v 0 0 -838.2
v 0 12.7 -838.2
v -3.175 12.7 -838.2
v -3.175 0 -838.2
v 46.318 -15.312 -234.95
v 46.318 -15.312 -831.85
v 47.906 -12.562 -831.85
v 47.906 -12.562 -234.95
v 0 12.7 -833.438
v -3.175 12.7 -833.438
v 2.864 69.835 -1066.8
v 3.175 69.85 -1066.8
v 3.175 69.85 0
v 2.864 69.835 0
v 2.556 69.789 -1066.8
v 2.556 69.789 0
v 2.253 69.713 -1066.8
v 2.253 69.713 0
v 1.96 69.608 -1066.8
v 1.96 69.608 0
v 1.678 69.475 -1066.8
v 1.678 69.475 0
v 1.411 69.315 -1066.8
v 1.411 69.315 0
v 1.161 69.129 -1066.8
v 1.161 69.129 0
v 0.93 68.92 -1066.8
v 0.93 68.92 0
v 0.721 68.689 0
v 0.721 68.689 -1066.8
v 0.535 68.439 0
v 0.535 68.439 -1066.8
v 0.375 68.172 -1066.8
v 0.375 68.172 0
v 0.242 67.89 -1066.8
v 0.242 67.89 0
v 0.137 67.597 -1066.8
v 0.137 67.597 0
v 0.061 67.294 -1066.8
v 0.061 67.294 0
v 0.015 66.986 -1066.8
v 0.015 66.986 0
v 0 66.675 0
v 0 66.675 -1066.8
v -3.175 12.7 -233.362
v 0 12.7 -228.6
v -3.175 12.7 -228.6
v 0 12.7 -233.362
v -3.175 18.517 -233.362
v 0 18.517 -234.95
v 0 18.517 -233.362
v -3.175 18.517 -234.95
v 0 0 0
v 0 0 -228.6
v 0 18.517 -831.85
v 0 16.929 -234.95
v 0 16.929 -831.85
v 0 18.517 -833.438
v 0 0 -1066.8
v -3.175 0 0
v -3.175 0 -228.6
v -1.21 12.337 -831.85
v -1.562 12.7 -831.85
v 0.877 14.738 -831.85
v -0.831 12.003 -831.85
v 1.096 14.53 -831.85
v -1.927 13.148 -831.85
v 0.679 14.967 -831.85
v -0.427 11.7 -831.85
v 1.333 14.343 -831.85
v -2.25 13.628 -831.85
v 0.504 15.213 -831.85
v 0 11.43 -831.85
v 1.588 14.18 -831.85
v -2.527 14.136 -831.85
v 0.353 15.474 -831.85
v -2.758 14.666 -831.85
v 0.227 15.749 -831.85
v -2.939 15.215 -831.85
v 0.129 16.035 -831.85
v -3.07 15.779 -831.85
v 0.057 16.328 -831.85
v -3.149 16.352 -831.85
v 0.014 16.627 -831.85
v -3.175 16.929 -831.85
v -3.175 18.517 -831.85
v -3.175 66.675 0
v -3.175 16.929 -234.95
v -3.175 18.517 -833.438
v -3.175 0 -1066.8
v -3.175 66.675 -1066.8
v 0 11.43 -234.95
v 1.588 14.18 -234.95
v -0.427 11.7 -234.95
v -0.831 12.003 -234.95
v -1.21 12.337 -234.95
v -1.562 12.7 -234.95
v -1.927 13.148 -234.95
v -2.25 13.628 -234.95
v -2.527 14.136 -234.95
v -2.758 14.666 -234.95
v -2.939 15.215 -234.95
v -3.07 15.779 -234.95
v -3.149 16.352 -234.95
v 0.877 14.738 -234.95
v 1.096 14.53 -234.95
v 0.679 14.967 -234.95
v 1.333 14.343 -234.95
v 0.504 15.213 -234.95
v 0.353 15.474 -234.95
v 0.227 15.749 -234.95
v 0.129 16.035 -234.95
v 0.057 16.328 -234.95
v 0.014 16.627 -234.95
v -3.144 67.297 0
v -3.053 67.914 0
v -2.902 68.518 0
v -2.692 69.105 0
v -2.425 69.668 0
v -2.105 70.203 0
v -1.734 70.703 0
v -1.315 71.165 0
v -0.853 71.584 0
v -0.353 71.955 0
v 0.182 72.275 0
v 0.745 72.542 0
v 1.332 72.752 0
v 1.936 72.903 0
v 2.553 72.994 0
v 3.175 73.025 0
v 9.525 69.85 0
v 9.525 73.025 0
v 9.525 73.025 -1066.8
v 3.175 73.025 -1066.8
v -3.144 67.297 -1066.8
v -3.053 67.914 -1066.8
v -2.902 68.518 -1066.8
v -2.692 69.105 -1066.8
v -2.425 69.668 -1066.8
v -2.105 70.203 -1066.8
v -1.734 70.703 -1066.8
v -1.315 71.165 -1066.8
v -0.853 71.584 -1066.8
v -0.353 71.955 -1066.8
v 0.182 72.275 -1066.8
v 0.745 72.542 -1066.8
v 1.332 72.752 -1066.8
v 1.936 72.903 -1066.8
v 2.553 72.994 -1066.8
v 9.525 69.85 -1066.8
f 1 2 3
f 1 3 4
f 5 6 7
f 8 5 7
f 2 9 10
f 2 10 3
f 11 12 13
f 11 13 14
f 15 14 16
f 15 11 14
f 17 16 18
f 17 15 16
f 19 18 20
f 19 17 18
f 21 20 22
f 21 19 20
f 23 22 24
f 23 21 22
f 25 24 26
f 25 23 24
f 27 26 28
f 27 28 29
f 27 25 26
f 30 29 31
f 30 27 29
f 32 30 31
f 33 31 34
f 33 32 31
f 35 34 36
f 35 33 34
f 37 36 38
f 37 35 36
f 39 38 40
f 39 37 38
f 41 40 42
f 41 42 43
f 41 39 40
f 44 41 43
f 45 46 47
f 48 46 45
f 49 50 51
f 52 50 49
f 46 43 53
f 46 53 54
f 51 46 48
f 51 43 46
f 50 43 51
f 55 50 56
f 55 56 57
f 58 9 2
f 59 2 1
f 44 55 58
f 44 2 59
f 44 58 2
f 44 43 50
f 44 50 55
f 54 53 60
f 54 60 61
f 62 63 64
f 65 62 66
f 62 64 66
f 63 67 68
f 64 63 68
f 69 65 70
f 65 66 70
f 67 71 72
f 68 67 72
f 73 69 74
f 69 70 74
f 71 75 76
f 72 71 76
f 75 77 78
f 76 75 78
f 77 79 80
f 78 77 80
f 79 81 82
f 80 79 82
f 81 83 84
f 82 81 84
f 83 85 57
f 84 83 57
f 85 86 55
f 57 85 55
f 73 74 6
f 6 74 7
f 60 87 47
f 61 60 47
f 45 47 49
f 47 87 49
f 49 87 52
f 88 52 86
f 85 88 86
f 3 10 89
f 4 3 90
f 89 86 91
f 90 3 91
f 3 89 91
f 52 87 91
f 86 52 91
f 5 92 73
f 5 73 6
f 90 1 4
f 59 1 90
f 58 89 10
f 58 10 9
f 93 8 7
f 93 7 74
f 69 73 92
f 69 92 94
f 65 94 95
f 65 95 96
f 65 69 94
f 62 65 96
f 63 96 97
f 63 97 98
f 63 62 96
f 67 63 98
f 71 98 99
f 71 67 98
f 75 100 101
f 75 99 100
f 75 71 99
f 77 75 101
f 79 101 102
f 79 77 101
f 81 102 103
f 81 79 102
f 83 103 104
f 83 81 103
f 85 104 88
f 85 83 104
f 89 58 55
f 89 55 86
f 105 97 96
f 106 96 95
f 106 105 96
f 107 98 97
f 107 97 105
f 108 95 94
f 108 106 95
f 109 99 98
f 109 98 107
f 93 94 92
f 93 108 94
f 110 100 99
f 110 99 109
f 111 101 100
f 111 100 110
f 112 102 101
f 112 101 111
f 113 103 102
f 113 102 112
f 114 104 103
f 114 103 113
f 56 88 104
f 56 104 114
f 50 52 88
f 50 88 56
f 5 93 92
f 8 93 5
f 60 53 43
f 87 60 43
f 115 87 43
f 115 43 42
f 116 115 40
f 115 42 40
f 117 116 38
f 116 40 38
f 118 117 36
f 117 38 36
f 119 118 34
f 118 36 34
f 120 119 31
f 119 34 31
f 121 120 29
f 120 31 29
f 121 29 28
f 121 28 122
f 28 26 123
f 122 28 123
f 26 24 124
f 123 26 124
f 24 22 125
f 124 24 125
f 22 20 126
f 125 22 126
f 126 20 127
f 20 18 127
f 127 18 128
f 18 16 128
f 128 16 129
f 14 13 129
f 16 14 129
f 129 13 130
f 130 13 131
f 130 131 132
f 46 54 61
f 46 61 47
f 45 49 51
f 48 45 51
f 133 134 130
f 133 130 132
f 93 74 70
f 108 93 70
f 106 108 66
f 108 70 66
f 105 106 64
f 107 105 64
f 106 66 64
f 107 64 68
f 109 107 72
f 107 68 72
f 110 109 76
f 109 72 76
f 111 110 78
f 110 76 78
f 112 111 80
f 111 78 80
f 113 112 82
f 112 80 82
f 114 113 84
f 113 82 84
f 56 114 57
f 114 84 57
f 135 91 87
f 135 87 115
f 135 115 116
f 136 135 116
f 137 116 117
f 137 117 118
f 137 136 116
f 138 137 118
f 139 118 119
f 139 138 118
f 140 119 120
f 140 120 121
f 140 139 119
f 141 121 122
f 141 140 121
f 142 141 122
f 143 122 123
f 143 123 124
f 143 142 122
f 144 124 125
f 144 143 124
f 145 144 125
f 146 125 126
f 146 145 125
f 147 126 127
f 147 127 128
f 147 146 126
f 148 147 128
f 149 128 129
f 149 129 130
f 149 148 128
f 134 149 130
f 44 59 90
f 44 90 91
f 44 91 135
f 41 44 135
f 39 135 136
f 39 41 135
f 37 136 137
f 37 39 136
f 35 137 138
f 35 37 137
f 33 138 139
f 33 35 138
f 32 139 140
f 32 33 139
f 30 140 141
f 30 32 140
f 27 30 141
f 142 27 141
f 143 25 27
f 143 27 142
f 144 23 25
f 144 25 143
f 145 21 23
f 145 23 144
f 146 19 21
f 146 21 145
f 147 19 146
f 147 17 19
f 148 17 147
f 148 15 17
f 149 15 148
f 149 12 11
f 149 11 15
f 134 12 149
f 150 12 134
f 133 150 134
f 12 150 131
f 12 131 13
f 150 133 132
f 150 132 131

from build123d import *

# Parameters (mm, degrees)
BASE_FLANGE1_DEPTH           = 3.175
EDGE_FLANGE1_START           = -833.4375
EDGE_FLANGE1_DEPTH           = 600.075
EDGE_FLANGE1_2_DEPTH         = 1.5875
EDGE_FLANGE1_START_2         = -234.95
EDGE_FLANGE1_3_DEPTH         = 1.5875
EDGE_FLANGE1_START_3         = -831.85
EDGE_FLANGE1_4_DEPTH         = 596.9
EDGE_FLANGE2_STRIP_W         = 19.05
EDGE_FLANGE2_STRIP_H         = 3.175
EDGE_FLANGE2_STRIP_CUT_DEPTH = 1066.8
EDGE_FLANGE2_DEPTH           = 1066.8


# Read off the part's stored shape, not the designer's step: Edge-Flange1
# Sheet-metal steps are written as plain solids
with BuildPart() as part:
    # Sketch1 → Base-Flange1 (new body)
    with BuildSketch(Plane(origin=(0, 0, 0), x_dir=(0, 0, -1), z_dir=(1, 0, 0))):
        Polygon((838.2, 0), (1066.8, 0), (1066.8, 73.025), (0, 73.025), (0, 0), (228.6, 0), (228.6, 12.7), (234.95, 12.7), (234.95, 11.43), (831.85, 11.43), (831.85, 12.7), (838.2, 12.7), align=None)
    extrude(amount=-BASE_FLANGE1_DEPTH)

    # Edge-Flange1 outline → Edge-Flange1 (cut)
    with BuildSketch(Plane.XY.offset(EDGE_FLANGE1_START)):
        with BuildLine():
            Line((-3.175, 16.929261314), (-3.175, 11.43))
            Line((-3.175, 11.43), (0, 11.43))
            ThreePointArc((0, 11.43), (-2.324261314, 13.754261314), (-3.175, 16.929261314))
        make_face()
    extrude(amount=EDGE_FLANGE1_DEPTH, mode=Mode.SUBTRACT)

    # Edge-Flange1 2 outline → Edge-Flange1 2 (cut)
    with BuildSketch(Plane.XY.offset(EDGE_FLANGE1_START)):
        with BuildLine():
            Line((0, 18.516761314), (-3.175, 18.516761314))
            Line((-3.175, 18.516761314), (-3.175, 16.929261314))
            ThreePointArc((-3.175, 16.929261314), (-2.757968249, 14.665992052), (-1.561649527, 12.7))
            Line((-1.561649527, 12.7), (0, 12.7))
            Line((0, 12.7), (0, 18.516761314))
        make_face()
    extrude(amount=EDGE_FLANGE1_2_DEPTH, mode=Mode.SUBTRACT)

    # Edge-Flange1 3 outline → Edge-Flange1 3 (cut)
    with BuildSketch(Plane.XY.offset(EDGE_FLANGE1_START_2)):
        with BuildLine():
            Line((0, 18.516761314), (-3.175, 18.516761314))
            Line((-3.175, 18.516761314), (-3.175, 16.929261314))
            ThreePointArc((-3.175, 16.929261314), (-2.757968249, 14.665992052), (-1.561649527, 12.7))
            Line((-1.561649527, 12.7), (0, 12.7))
            Line((0, 12.7), (0, 18.516761314))
        make_face()
    extrude(amount=EDGE_FLANGE1_3_DEPTH, mode=Mode.SUBTRACT)

    # Edge-Flange1 4 outline → Edge-Flange1 4 (add)
    with BuildSketch(Plane.XY.offset(EDGE_FLANGE1_START_3)):
        with BuildLine():
            ThreePointArc((1.5875, 14.179630657), (0.425369343, 15.341761314), (0, 16.929261314))
            Line((0, 16.929261314), (0, 11.43))
            Line((0, 11.43), (46.318351826, -15.311912895))
            Line((46.318351826, -15.311912895), (47.905851826, -12.562282238))
            Line((47.905851826, -12.562282238), (1.5875, 14.179630657))
        make_face()
    extrude(amount=EDGE_FLANGE1_4_DEPTH)

    # Edge-Flange2 strip (across the edge) → Edge-Flange2 strip cut (cut)
    with BuildSketch(Plane(origin=(0, 73.025, -1066.8), x_dir=(0, -1, 0), z_dir=(0, 0, 1))):
        with Locations((-3.175, -1.5875)):
            Rectangle(EDGE_FLANGE2_STRIP_W, EDGE_FLANGE2_STRIP_H)
    extrude(amount=EDGE_FLANGE2_STRIP_CUT_DEPTH, mode=Mode.SUBTRACT)

    # Edge-Flange2 section (across the edge) → Edge-Flange2 (add)
    with BuildSketch(Plane(origin=(0, 73.025, -1066.8), x_dir=(0, -1, 0), z_dir=(0, 0, 1))):
        with BuildLine():
            Line((0, 3.175), (0, 9.525))
            Line((0, 9.525), (3.175, 9.525))
            Line((3.175, 9.525), (3.175, 3.175))
            ThreePointArc((3.175, 3.175), (4.10493597, 0.92993597), (6.35, 0))
            Line((6.35, 0), (6.35, -3.175))
            ThreePointArc((6.35, -3.175), (1.859871939, -1.315128061), (0, 3.175))
        make_face()
    extrude(amount=EDGE_FLANGE2_DEPTH)


solid = part.part
